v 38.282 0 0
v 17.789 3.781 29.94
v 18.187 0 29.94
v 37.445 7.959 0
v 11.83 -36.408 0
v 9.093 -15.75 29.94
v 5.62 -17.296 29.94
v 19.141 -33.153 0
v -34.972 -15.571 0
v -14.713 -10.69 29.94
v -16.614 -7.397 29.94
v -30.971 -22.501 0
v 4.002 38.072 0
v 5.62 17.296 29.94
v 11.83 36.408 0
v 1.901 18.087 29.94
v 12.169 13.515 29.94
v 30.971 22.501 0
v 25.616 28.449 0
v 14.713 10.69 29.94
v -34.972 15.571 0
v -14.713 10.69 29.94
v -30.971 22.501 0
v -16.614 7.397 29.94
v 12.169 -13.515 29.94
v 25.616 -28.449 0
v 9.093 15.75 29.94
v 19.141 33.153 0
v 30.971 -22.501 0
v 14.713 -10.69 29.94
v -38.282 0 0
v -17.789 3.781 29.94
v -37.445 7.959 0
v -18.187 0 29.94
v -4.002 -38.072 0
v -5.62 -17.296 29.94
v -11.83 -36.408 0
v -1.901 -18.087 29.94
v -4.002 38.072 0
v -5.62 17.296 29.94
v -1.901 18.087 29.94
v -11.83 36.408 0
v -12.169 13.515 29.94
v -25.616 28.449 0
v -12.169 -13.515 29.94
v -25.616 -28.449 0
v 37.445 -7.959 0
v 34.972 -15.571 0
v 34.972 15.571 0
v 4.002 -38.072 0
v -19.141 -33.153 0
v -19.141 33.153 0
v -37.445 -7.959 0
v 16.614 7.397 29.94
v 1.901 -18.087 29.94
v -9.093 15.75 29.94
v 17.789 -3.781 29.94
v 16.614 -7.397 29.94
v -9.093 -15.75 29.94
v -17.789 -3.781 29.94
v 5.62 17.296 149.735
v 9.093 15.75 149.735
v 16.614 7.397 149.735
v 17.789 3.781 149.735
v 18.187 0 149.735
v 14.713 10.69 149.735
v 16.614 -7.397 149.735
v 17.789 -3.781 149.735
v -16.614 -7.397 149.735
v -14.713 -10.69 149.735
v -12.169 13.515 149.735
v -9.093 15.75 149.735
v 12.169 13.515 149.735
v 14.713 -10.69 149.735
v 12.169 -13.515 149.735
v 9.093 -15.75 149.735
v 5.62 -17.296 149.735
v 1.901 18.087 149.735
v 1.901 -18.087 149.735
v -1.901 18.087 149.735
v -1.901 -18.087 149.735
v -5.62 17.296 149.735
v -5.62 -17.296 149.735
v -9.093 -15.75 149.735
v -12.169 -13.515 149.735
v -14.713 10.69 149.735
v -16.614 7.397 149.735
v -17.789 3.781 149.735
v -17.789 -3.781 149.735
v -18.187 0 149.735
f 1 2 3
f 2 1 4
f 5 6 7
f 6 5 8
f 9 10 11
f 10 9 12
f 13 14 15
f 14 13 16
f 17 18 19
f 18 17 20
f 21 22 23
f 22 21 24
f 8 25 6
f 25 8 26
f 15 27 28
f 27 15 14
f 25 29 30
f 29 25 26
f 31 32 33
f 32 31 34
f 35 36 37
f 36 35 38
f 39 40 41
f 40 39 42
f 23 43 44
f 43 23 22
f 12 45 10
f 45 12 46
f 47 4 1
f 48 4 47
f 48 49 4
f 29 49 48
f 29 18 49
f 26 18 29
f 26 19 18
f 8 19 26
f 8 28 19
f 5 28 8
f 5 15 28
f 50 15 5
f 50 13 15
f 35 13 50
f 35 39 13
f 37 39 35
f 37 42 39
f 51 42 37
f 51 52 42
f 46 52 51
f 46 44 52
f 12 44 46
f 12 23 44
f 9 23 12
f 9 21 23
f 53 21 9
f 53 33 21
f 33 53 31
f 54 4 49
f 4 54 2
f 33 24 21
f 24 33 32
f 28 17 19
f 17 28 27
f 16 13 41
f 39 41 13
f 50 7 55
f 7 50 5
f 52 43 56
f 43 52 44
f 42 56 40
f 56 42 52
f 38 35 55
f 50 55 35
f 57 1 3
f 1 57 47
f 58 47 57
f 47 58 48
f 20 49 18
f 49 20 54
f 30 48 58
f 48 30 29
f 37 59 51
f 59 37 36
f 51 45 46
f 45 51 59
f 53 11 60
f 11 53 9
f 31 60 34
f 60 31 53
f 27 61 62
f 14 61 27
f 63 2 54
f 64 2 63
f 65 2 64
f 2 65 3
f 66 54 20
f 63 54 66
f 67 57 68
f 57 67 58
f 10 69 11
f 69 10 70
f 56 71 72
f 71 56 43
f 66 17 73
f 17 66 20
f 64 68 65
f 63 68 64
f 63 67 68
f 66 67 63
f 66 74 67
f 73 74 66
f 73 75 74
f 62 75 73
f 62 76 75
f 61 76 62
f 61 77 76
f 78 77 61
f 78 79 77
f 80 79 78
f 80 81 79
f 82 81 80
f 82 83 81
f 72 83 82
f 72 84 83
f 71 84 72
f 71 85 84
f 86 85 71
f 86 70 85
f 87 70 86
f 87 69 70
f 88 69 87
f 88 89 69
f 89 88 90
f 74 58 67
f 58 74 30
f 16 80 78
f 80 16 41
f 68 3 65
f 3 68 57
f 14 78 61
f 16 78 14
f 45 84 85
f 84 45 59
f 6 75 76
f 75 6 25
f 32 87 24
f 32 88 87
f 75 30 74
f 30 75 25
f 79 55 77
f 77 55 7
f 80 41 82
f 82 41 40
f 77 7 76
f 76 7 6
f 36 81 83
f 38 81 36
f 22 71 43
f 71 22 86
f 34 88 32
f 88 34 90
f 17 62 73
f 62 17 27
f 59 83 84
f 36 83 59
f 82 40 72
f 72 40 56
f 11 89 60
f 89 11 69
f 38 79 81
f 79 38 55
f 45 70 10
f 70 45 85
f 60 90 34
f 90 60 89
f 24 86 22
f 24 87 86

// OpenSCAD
seed = 0;
seeds = rands(0,1000000,10,seed);
head_outer_radius = rands(25,50,1,seeds[0])[0];
head_inner_radius = rands(10,head_outer_radius*2/3,1,seeds[1])[0];
head_length = rands(40,80,1,seeds[2])[0];
bolt_length = rands(head_length*2,200,1,seeds[3])[0];

union(){
    cylinder(head_length,head_outer_radius,0);
    cylinder(bolt_length,head_inner_radius,head_inner_radius);
}
